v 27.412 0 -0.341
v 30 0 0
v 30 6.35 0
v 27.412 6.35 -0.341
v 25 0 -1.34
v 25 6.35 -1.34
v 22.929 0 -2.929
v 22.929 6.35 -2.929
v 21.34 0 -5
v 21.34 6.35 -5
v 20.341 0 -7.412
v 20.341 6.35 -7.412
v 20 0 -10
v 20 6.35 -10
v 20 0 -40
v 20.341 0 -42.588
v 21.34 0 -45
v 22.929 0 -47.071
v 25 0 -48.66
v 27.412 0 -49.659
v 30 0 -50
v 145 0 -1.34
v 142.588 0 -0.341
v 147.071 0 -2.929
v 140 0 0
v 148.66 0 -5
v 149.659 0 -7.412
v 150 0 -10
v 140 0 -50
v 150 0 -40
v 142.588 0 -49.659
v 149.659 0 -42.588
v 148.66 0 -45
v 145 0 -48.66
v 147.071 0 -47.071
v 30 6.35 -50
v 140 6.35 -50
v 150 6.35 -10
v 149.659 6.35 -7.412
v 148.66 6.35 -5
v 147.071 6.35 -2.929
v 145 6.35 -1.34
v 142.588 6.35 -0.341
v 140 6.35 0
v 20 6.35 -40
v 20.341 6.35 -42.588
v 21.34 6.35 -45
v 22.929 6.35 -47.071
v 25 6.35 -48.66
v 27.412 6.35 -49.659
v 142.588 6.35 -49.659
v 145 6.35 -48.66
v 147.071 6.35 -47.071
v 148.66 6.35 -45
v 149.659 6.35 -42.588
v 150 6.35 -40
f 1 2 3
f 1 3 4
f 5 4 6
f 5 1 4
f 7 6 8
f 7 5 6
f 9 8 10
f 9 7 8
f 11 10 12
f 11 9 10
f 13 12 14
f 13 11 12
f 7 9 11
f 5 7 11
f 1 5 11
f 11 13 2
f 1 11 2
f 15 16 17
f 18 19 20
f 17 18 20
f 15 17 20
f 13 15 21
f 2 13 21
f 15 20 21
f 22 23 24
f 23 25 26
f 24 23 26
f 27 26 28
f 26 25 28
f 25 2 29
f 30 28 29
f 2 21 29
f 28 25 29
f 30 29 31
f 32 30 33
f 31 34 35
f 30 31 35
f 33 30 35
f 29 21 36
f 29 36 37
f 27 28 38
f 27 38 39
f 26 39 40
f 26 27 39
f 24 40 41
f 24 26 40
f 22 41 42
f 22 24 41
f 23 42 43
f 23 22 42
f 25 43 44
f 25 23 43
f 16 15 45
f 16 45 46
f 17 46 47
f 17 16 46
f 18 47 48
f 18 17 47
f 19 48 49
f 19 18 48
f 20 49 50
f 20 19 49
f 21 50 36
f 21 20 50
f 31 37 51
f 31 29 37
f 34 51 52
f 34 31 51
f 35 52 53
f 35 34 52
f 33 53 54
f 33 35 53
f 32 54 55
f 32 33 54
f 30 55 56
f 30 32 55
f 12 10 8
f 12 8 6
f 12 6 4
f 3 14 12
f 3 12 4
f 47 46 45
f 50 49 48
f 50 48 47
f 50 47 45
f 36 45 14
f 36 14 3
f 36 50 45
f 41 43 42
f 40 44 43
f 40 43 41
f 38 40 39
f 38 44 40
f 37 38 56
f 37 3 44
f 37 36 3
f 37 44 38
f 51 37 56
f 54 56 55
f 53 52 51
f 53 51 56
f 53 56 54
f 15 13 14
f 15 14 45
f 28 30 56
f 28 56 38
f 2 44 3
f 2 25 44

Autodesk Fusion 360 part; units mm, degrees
sketch "Sketch1" plane through (0, 0, 0) normal (0, 1, 0) x (1, 0, 0)
  line L0 (30, 50) -> (140, 50)
  line L1 (150, 40) -> (150, 10)
  line L2 (140, 0) -> (30, 0)
  line L3 (20, 10) -> (20, 40)
  arc A0 (150, 40) -> (140, 50) centre (140, 40) ccw
  arc A1 (140, 0) -> (150, 10) centre (140, 10) ccw
  arc A2 (30, 50) -> (20, 40) centre (30, 40) ccw
  arc A3 (20, 10) -> (30, 0) centre (30, 10) ccw
  point P0 (20, 50)
  point P1 (150, 50)
  point P2 (20, 0)
  dimension "d1" = 130
  dimension "d2" = 50
  dimension "d7" = 10
  dimension "d8" = 10
  dimension "d9" = 10
  dimension "d10" = 10
extrude "Extrude1" add sketch "Sketch1" along normal blind 6.35
